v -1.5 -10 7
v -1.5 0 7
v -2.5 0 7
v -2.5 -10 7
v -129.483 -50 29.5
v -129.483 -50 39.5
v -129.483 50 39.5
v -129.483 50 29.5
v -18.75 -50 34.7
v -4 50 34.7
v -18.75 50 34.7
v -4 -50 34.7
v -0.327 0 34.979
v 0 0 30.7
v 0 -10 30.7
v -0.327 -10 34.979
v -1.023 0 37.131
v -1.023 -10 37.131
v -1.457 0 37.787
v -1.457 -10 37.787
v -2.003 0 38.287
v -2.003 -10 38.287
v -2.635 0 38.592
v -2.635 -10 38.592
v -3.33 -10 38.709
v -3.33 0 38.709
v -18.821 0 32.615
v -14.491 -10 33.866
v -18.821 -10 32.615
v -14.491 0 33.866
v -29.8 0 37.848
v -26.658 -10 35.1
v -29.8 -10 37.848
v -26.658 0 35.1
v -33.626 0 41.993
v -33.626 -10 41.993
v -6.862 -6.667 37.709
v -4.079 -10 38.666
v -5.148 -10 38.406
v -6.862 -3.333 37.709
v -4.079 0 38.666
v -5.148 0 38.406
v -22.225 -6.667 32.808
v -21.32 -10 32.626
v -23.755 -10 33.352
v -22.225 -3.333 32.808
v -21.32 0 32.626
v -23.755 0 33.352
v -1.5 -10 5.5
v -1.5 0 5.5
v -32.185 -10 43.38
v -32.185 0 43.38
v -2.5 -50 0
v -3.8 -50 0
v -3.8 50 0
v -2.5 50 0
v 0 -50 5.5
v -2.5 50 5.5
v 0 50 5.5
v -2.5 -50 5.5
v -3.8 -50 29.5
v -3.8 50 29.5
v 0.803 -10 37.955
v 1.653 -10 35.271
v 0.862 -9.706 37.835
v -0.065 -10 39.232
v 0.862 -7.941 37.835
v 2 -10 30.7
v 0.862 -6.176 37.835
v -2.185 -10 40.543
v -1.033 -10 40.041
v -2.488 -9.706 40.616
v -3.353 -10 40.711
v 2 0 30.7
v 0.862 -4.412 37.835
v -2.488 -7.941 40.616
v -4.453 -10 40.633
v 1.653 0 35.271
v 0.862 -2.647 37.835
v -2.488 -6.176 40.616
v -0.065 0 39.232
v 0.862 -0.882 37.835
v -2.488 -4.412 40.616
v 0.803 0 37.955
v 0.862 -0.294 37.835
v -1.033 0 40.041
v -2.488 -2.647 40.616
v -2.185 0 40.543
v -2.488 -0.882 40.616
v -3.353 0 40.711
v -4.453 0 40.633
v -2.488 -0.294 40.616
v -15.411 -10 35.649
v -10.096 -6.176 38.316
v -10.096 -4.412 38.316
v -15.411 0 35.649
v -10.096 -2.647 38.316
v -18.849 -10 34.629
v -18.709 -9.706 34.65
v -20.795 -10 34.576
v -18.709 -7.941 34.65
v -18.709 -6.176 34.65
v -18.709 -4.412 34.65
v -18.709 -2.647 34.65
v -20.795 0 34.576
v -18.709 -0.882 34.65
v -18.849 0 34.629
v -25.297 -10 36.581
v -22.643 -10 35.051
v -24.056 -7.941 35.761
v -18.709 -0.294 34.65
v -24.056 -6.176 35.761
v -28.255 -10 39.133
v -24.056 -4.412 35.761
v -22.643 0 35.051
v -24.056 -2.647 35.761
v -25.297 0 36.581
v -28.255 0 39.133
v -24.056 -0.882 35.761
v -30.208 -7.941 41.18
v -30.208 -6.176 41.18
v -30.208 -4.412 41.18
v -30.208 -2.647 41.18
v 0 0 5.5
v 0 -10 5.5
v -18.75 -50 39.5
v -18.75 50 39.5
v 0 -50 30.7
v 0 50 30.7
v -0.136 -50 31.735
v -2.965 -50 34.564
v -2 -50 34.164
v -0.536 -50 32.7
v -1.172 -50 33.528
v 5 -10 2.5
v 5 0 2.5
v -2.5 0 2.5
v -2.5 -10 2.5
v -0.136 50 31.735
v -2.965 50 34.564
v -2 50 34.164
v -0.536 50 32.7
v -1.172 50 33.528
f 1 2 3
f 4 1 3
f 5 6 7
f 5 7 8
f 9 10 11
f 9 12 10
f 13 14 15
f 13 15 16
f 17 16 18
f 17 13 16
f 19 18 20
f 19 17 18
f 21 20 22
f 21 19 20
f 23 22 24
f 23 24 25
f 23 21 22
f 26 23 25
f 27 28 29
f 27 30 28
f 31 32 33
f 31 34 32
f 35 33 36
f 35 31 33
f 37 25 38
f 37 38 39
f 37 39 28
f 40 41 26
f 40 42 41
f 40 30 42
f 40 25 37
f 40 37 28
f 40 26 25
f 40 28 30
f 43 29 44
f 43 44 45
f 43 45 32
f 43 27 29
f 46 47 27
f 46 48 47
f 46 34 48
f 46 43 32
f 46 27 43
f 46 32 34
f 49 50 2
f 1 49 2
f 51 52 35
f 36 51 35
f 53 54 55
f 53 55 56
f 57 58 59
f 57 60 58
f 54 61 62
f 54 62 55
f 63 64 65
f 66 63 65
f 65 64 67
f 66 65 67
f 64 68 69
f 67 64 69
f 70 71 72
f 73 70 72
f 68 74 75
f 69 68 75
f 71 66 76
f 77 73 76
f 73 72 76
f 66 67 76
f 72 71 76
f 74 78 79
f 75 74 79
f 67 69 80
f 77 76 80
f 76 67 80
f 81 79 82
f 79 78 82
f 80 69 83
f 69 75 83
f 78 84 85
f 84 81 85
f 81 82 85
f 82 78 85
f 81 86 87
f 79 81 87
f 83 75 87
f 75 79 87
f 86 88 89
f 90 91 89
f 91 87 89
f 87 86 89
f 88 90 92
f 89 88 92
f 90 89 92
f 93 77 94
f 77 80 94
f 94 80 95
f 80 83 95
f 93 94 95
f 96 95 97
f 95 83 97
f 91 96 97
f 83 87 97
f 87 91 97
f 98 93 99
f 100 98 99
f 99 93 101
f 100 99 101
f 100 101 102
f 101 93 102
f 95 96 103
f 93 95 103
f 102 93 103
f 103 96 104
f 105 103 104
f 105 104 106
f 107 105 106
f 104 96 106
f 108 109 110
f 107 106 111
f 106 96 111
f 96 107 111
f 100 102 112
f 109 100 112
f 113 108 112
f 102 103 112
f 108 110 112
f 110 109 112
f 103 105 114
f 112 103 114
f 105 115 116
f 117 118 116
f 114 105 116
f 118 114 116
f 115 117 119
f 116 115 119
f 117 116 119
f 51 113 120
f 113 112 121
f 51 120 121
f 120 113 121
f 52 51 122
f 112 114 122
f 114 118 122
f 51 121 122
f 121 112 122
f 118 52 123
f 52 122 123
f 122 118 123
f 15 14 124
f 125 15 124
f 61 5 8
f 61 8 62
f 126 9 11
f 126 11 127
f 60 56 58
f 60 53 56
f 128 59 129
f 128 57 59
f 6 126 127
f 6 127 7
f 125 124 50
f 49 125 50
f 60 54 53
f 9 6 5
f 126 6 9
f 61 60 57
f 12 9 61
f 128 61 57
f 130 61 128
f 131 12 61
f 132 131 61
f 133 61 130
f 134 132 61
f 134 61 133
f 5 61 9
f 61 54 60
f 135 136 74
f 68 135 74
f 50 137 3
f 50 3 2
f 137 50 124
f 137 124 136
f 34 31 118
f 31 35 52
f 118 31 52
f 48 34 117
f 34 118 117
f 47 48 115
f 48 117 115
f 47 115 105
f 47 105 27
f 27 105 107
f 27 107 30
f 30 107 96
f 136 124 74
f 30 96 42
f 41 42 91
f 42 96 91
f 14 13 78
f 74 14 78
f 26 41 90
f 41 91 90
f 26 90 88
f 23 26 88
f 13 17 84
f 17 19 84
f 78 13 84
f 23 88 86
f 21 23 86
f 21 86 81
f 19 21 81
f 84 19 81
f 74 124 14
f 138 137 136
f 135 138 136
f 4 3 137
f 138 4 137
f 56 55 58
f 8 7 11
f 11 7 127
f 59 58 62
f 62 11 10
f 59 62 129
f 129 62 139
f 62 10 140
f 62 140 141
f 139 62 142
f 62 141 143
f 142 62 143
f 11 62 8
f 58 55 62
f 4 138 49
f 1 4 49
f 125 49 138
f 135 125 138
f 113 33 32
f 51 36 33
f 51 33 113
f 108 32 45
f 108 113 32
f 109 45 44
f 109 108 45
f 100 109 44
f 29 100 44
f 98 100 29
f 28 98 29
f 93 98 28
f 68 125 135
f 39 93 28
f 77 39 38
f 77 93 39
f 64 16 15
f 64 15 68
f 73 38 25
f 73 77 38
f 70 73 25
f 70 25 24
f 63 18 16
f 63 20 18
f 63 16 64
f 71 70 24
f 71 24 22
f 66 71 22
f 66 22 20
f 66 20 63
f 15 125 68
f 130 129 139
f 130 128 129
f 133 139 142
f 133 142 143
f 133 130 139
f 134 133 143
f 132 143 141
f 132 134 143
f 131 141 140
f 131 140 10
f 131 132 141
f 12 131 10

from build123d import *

# Parameters (mm, degrees)
F1_DEPTH = 50
F2_R     = 4
F4_DEPTH = 10


# Not quite as in the source:
# - the dataset's text gives a spline's control points without its knots; the knots are read off the source's solid


with BuildPart() as f1:
    # F0 (on Front) → F1 (new body, symmetric)
    with BuildSketch(Plane.XZ):
        Polygon((0, 5.5), (0, 34.7), (-18.75, 34.7), (-18.75, 39.5), (-129.4826599298, 39.5), (-129.4826599298, 29.5), (-3.8, 29.5), (-3.8, 0), (-2.5, 0), (-2.5, 5.5), align=None)
    extrude(amount=F1_DEPTH, both=True)

    # F2
    f2_edges = [f1.edges().sort_by_distance(p)[0] for p in [
        (0, 0, 34.7),
    ]]
    fillet(f2_edges, radius=F2_R)


with BuildPart() as f4:
    # F3 (on Front) → F4 (new body)
    with BuildSketch(Plane.XZ):
        with BuildLine():
            Line((0, 30.7), (0, 5.5))
            Line((0, 5.5), (-1.5, 5.5))
            Line((-1.5, 5.5), (-1.5, 7))
            Line((-1.5, 7), (-2.5, 7))
            Line((-2.5, 7), (-2.5, 5.5))
            Line((-2.5, 5.5), (-2.5, 2.5))
            Line((-2.5, 2.5), (5, 2.5))
            Line((5, 2.5), (2, 30.7))
            add(Edge.make_bspline(
                [(2, 30.7), (2, 31.7663755094), (1.9197978856, 33.6815229202), (1.560050438, 36.0024950572), (1.0325239491, 37.5777989644), (0.4158888599, 38.6629640394), (-0.1636126536, 39.3793411079), (-0.8646567386, 39.9695560734), (-1.6592021315, 40.3955071637), (-2.4904020482, 40.6421178896), (-3.5805366392, 40.7585096187), (-4.8446996517, 40.6044084525), (-6.228916873, 40.1740055139), (-7.3247518132, 39.7044300401), (-8.1785645119, 39.2998972581), (-9.0326113969, 38.8755002829), (-10.096764527, 38.3183652887), (-11.7962518236, 37.4052131626), (-13.9106977139, 36.2897970194), (-16.3926786988, 35.2017320437), (-18.3509918097, 34.6630955174), (-19.8166550492, 34.5167284053), (-20.6917970101, 34.5499347509), (-21.3766716144, 34.6571924904), (-21.8821148851, 34.7794442799), (-22.4057251629, 34.9520837377), (-23.1251886297, 35.2478795474), (-24.0538174781, 35.7349619931), (-25.1834777576, 36.4780606848), (-26.3004948953, 37.3423008268), (-27.7421408169, 38.6023216567), (-29.0715230137, 39.9406021799), (-30.2243827664, 41.1936677419), (-30.9885209637, 42.052275421), (-31.6443353319, 42.7955467899), (-32.0096009958, 43.1975262649), (-32.1846689975, 43.3795967395)],
                knots=[0, 0, 0, 0, 0.03125, 0.0625, 0.09375, 0.109375, 0.125, 0.140625, 0.15625, 0.171875, 0.1875, 0.21875, 0.25, 0.28125, 0.296875, 0.3125, 0.34375, 0.375, 0.4375, 0.5, 0.5625, 0.59375, 0.625, 0.640625, 0.65625, 0.671875, 0.6875, 0.71875, 0.75, 0.78125, 0.8125, 0.875, 0.90625, 0.9375, 0.96875, 1, 1, 1, 1], degree=3))
            Line((-32.1846689975, 43.3795967395), (-33.6263341869, 41.993378329))
            add(Edge.make_bspline(
                [(0, 30.7), (0, 39.9784169766), (-7.3101929171, 38.6941557742), (-22.175657359, 27.5773311116), (-32.0087713963, 40.311115311), (-33.6263341869, 41.993378329)],
                knots=[0, 0, 0, 0, 0.2853917714, 0.6513245985, 1, 1, 1, 1], degree=3))
        make_face()
    extrude(amount=F4_DEPTH)


solid = Compound([f1.part, f4.part])
